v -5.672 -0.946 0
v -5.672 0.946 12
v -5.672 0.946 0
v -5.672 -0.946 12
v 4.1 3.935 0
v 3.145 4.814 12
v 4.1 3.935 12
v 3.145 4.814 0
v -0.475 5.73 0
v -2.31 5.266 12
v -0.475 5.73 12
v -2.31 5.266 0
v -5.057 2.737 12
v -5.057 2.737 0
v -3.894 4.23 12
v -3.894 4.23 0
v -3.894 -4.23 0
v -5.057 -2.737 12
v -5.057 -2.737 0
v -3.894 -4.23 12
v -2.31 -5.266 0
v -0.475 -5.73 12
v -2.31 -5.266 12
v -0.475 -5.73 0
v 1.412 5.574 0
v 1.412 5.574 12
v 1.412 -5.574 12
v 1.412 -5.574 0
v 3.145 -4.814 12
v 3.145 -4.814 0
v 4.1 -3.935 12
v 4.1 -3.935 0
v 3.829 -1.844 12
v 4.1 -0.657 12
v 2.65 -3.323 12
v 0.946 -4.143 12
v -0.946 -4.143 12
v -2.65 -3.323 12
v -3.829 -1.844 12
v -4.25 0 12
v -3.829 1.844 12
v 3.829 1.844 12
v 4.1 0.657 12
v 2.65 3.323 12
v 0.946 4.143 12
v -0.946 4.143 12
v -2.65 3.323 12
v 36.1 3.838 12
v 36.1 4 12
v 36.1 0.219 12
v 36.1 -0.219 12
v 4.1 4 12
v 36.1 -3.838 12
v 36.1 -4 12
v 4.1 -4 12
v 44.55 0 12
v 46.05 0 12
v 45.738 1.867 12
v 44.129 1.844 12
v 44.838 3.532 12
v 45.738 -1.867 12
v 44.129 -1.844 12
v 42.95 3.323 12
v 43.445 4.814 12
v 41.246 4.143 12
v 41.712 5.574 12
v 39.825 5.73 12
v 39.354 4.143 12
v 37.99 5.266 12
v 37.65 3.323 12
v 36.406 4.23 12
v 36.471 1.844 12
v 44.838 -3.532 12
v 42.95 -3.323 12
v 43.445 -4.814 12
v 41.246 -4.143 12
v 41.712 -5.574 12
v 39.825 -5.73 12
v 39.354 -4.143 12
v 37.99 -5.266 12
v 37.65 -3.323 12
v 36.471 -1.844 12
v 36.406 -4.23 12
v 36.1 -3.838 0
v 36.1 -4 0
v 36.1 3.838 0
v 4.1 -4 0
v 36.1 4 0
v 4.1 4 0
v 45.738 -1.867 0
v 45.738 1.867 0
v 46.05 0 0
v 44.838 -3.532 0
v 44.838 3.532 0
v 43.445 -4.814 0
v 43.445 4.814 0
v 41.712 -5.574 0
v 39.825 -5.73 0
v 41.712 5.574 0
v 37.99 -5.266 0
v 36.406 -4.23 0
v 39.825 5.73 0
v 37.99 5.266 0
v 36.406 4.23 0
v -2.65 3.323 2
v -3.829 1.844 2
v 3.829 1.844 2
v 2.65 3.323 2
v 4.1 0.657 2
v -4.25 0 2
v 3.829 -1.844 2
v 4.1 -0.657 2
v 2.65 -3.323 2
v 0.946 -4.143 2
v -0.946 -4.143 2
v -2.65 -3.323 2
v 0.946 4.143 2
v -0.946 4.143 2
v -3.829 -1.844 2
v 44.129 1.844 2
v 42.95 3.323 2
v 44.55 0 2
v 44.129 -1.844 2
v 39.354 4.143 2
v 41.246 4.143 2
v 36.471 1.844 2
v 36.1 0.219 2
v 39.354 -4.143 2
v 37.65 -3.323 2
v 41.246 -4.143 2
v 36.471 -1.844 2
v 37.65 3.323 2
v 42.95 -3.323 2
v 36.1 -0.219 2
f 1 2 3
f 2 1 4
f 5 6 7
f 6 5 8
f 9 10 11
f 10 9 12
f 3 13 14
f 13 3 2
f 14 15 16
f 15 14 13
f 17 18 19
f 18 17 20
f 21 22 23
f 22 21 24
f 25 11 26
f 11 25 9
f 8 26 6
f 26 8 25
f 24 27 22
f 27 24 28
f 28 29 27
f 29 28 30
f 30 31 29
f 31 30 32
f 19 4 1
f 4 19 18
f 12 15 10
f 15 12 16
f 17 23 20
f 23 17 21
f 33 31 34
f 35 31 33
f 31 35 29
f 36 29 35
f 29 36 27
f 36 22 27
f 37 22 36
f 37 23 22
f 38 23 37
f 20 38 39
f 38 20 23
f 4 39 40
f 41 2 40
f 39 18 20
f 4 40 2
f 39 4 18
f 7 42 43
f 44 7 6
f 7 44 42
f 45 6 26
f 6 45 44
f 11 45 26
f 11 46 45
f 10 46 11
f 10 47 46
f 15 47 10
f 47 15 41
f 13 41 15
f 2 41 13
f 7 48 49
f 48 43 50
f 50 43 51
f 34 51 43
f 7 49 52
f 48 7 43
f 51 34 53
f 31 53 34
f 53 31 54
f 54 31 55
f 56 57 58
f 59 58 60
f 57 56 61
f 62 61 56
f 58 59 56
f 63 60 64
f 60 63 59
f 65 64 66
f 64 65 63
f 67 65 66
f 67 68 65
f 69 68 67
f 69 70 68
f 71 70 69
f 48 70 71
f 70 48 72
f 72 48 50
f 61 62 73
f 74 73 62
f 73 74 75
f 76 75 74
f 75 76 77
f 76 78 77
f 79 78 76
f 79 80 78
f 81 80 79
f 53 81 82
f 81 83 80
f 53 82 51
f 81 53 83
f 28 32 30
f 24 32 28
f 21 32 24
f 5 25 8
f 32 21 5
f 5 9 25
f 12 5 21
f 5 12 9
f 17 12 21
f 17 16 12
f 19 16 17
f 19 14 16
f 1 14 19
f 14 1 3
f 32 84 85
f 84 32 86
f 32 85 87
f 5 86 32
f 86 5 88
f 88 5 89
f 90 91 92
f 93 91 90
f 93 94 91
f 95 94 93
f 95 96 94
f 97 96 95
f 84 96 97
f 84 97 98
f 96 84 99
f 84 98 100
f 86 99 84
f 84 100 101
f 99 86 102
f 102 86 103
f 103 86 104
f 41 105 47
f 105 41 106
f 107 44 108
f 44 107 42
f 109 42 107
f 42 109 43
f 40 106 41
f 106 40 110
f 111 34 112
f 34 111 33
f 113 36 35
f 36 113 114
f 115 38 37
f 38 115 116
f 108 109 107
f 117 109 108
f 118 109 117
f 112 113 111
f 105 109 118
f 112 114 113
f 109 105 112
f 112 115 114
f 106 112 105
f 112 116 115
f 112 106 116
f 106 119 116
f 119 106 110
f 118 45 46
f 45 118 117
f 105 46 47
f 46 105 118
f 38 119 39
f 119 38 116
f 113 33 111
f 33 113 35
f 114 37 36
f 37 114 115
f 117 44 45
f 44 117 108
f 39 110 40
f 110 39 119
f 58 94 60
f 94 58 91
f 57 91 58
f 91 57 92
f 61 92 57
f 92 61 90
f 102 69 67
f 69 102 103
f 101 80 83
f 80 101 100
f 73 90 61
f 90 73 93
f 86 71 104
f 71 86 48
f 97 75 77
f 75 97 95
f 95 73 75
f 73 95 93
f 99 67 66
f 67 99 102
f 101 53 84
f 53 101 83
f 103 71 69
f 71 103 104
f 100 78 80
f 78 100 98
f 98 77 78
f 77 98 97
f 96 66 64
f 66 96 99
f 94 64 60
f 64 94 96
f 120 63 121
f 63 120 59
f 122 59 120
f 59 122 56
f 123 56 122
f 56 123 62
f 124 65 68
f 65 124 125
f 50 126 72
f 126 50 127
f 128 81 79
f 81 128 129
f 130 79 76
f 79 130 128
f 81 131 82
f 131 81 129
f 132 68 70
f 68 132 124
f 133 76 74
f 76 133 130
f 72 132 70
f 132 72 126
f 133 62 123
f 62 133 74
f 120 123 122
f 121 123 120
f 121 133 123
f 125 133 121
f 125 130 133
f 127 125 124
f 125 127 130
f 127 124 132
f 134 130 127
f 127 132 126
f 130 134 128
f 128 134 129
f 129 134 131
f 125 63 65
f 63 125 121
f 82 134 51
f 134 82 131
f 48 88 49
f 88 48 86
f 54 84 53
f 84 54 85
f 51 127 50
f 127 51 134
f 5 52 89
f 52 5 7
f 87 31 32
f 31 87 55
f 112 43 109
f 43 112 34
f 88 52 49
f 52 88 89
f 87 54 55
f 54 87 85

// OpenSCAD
height=12;
poleInner=8.5;
poleOuter=poleInner+3;

difference(){
    cylinder(h=height, d=poleOuter);
    translate([0, 0, 2])
    cylinder(h=height, d=poleInner);
}

difference(){
    translate([40.3, 0, 0])
    cylinder(h=height, d=poleOuter);
    translate([40.3, 0, 2])
    cylinder(h=height, d=poleInner);
}

translate([4.1, -4, 0])
cube([32, 8, height]);
